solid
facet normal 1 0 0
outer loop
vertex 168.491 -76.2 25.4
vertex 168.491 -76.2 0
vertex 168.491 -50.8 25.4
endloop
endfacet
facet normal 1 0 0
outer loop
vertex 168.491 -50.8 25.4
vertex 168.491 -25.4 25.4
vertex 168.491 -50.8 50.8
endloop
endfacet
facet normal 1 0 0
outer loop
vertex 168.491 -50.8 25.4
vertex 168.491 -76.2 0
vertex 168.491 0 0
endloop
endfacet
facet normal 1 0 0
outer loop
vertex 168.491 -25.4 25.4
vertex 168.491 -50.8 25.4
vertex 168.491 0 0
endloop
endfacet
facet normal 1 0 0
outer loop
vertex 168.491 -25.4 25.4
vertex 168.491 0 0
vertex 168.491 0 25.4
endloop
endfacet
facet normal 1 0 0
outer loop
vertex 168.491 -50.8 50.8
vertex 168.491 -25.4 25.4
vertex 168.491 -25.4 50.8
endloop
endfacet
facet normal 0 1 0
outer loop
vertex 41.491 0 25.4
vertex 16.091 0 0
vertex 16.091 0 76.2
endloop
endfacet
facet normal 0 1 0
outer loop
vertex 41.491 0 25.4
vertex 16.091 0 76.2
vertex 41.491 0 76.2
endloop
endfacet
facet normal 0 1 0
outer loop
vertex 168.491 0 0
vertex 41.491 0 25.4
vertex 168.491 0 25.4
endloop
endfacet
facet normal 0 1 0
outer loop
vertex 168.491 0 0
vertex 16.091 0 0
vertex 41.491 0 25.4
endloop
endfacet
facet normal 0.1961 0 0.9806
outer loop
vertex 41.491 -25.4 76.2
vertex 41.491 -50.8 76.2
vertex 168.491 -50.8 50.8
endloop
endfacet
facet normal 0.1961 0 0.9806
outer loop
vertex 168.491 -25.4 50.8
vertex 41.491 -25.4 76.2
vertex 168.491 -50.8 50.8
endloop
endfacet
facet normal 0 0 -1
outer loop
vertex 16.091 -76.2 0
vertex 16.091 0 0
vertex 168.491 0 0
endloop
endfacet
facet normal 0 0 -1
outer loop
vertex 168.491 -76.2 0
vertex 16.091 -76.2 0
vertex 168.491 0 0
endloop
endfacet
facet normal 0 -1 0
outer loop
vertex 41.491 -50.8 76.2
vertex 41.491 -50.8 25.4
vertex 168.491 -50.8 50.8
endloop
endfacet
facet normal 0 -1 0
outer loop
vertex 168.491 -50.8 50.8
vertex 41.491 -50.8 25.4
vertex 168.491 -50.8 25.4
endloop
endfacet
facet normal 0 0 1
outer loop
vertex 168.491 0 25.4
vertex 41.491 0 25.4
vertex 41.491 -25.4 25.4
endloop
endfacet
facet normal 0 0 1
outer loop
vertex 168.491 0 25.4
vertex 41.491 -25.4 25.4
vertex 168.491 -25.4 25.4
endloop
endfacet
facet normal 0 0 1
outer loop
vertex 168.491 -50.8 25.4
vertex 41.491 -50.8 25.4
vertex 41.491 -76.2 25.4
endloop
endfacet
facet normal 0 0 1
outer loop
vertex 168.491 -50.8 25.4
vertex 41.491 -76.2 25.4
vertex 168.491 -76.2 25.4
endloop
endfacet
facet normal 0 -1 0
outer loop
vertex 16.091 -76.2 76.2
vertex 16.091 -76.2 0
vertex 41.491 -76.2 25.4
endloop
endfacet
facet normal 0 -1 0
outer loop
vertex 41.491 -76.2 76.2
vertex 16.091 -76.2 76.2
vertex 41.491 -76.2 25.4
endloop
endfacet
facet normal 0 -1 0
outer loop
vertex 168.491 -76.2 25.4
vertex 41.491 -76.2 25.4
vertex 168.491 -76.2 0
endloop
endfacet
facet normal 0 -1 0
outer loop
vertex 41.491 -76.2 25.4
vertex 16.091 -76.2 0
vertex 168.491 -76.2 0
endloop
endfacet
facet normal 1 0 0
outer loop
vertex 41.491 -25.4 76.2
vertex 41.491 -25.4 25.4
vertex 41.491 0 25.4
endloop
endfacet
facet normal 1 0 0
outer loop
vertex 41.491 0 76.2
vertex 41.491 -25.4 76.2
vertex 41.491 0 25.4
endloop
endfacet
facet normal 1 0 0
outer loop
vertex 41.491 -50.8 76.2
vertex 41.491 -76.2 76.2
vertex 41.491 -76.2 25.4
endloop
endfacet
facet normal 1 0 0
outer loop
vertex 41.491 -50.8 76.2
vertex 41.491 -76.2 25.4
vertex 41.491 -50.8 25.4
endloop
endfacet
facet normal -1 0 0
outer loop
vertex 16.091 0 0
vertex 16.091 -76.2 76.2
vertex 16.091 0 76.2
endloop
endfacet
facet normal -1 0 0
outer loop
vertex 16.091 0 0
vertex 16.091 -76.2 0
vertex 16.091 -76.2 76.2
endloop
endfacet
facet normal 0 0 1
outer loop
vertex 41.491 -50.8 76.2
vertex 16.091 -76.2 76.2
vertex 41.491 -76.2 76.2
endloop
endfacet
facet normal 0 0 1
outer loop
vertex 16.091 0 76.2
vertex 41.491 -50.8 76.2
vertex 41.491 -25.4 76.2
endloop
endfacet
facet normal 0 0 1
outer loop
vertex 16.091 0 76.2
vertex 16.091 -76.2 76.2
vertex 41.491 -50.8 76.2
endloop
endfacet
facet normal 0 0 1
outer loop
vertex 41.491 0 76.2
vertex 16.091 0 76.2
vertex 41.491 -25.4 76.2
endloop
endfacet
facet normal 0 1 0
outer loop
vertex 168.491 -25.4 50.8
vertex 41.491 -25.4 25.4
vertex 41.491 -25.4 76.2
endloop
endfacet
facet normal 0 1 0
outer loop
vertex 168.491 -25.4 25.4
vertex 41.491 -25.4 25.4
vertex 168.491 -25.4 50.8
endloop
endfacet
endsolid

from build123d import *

# Parameters (mm, degrees)
F0_W     = 152.4
F0_H     = 50.8
F1_DEPTH = 76.2
F2_W     = 25.4
F2_H     = 76.2
F3_DEPTH = 25.4
F4_W     = 127
F4_H     = 25.4
F5_DEPTH = 25.4
F7_DEPTH = 25.4
F8_DEPTH = 25.4
F9_DEPTH = 25.4


with BuildPart() as f1:
    # F0 (on Front) → F1 (new body)
    with BuildSketch(Plane.XZ):
        with Locations((92.2907766924, 25.4)):
            Rectangle(F0_W, F0_H)
    extrude(amount=F1_DEPTH)

    # F2 (on face) → F3 (join)
    with BuildSketch(Plane.XY.offset(50.8)):
        with Locations((28.7907766924, -38.1)):
            Rectangle(F2_W, F2_H)
    extrude(amount=F3_DEPTH)

    # F4 (on face) → F5 (join)
    with BuildSketch(Plane.XY.offset(50.8)):
        with Locations((104.9907766924, -38.1)):
            Rectangle(F4_W, F4_H)
    extrude(amount=F5_DEPTH)

    # F6 (on face) → F7 (cut)
    with BuildSketch(Plane.XZ.offset(50.8)):
        Polygon((41.4907766924, 76.2), (168.4907766924, 50.8), (168.4907766924, 76.2), align=None)
    extrude(amount=-F7_DEPTH, mode=Mode.SUBTRACT)

    # F8 (cut): a face of the model
    f8_faces = [f1.faces().sort_by_distance(p)[0] for p in [
        (104.9907766924, -63.5, 50.8),
    ]]
    extrude(f8_faces, amount=-F8_DEPTH, mode=Mode.SUBTRACT)

    # F9 (cut): a face of the model
    f9_faces = [f1.faces().sort_by_distance(p)[0] for p in [
        (104.9907766924, -12.7, 50.8),
    ]]
    extrude(f9_faces, amount=-F9_DEPTH, mode=Mode.SUBTRACT)


solid = f1.part
